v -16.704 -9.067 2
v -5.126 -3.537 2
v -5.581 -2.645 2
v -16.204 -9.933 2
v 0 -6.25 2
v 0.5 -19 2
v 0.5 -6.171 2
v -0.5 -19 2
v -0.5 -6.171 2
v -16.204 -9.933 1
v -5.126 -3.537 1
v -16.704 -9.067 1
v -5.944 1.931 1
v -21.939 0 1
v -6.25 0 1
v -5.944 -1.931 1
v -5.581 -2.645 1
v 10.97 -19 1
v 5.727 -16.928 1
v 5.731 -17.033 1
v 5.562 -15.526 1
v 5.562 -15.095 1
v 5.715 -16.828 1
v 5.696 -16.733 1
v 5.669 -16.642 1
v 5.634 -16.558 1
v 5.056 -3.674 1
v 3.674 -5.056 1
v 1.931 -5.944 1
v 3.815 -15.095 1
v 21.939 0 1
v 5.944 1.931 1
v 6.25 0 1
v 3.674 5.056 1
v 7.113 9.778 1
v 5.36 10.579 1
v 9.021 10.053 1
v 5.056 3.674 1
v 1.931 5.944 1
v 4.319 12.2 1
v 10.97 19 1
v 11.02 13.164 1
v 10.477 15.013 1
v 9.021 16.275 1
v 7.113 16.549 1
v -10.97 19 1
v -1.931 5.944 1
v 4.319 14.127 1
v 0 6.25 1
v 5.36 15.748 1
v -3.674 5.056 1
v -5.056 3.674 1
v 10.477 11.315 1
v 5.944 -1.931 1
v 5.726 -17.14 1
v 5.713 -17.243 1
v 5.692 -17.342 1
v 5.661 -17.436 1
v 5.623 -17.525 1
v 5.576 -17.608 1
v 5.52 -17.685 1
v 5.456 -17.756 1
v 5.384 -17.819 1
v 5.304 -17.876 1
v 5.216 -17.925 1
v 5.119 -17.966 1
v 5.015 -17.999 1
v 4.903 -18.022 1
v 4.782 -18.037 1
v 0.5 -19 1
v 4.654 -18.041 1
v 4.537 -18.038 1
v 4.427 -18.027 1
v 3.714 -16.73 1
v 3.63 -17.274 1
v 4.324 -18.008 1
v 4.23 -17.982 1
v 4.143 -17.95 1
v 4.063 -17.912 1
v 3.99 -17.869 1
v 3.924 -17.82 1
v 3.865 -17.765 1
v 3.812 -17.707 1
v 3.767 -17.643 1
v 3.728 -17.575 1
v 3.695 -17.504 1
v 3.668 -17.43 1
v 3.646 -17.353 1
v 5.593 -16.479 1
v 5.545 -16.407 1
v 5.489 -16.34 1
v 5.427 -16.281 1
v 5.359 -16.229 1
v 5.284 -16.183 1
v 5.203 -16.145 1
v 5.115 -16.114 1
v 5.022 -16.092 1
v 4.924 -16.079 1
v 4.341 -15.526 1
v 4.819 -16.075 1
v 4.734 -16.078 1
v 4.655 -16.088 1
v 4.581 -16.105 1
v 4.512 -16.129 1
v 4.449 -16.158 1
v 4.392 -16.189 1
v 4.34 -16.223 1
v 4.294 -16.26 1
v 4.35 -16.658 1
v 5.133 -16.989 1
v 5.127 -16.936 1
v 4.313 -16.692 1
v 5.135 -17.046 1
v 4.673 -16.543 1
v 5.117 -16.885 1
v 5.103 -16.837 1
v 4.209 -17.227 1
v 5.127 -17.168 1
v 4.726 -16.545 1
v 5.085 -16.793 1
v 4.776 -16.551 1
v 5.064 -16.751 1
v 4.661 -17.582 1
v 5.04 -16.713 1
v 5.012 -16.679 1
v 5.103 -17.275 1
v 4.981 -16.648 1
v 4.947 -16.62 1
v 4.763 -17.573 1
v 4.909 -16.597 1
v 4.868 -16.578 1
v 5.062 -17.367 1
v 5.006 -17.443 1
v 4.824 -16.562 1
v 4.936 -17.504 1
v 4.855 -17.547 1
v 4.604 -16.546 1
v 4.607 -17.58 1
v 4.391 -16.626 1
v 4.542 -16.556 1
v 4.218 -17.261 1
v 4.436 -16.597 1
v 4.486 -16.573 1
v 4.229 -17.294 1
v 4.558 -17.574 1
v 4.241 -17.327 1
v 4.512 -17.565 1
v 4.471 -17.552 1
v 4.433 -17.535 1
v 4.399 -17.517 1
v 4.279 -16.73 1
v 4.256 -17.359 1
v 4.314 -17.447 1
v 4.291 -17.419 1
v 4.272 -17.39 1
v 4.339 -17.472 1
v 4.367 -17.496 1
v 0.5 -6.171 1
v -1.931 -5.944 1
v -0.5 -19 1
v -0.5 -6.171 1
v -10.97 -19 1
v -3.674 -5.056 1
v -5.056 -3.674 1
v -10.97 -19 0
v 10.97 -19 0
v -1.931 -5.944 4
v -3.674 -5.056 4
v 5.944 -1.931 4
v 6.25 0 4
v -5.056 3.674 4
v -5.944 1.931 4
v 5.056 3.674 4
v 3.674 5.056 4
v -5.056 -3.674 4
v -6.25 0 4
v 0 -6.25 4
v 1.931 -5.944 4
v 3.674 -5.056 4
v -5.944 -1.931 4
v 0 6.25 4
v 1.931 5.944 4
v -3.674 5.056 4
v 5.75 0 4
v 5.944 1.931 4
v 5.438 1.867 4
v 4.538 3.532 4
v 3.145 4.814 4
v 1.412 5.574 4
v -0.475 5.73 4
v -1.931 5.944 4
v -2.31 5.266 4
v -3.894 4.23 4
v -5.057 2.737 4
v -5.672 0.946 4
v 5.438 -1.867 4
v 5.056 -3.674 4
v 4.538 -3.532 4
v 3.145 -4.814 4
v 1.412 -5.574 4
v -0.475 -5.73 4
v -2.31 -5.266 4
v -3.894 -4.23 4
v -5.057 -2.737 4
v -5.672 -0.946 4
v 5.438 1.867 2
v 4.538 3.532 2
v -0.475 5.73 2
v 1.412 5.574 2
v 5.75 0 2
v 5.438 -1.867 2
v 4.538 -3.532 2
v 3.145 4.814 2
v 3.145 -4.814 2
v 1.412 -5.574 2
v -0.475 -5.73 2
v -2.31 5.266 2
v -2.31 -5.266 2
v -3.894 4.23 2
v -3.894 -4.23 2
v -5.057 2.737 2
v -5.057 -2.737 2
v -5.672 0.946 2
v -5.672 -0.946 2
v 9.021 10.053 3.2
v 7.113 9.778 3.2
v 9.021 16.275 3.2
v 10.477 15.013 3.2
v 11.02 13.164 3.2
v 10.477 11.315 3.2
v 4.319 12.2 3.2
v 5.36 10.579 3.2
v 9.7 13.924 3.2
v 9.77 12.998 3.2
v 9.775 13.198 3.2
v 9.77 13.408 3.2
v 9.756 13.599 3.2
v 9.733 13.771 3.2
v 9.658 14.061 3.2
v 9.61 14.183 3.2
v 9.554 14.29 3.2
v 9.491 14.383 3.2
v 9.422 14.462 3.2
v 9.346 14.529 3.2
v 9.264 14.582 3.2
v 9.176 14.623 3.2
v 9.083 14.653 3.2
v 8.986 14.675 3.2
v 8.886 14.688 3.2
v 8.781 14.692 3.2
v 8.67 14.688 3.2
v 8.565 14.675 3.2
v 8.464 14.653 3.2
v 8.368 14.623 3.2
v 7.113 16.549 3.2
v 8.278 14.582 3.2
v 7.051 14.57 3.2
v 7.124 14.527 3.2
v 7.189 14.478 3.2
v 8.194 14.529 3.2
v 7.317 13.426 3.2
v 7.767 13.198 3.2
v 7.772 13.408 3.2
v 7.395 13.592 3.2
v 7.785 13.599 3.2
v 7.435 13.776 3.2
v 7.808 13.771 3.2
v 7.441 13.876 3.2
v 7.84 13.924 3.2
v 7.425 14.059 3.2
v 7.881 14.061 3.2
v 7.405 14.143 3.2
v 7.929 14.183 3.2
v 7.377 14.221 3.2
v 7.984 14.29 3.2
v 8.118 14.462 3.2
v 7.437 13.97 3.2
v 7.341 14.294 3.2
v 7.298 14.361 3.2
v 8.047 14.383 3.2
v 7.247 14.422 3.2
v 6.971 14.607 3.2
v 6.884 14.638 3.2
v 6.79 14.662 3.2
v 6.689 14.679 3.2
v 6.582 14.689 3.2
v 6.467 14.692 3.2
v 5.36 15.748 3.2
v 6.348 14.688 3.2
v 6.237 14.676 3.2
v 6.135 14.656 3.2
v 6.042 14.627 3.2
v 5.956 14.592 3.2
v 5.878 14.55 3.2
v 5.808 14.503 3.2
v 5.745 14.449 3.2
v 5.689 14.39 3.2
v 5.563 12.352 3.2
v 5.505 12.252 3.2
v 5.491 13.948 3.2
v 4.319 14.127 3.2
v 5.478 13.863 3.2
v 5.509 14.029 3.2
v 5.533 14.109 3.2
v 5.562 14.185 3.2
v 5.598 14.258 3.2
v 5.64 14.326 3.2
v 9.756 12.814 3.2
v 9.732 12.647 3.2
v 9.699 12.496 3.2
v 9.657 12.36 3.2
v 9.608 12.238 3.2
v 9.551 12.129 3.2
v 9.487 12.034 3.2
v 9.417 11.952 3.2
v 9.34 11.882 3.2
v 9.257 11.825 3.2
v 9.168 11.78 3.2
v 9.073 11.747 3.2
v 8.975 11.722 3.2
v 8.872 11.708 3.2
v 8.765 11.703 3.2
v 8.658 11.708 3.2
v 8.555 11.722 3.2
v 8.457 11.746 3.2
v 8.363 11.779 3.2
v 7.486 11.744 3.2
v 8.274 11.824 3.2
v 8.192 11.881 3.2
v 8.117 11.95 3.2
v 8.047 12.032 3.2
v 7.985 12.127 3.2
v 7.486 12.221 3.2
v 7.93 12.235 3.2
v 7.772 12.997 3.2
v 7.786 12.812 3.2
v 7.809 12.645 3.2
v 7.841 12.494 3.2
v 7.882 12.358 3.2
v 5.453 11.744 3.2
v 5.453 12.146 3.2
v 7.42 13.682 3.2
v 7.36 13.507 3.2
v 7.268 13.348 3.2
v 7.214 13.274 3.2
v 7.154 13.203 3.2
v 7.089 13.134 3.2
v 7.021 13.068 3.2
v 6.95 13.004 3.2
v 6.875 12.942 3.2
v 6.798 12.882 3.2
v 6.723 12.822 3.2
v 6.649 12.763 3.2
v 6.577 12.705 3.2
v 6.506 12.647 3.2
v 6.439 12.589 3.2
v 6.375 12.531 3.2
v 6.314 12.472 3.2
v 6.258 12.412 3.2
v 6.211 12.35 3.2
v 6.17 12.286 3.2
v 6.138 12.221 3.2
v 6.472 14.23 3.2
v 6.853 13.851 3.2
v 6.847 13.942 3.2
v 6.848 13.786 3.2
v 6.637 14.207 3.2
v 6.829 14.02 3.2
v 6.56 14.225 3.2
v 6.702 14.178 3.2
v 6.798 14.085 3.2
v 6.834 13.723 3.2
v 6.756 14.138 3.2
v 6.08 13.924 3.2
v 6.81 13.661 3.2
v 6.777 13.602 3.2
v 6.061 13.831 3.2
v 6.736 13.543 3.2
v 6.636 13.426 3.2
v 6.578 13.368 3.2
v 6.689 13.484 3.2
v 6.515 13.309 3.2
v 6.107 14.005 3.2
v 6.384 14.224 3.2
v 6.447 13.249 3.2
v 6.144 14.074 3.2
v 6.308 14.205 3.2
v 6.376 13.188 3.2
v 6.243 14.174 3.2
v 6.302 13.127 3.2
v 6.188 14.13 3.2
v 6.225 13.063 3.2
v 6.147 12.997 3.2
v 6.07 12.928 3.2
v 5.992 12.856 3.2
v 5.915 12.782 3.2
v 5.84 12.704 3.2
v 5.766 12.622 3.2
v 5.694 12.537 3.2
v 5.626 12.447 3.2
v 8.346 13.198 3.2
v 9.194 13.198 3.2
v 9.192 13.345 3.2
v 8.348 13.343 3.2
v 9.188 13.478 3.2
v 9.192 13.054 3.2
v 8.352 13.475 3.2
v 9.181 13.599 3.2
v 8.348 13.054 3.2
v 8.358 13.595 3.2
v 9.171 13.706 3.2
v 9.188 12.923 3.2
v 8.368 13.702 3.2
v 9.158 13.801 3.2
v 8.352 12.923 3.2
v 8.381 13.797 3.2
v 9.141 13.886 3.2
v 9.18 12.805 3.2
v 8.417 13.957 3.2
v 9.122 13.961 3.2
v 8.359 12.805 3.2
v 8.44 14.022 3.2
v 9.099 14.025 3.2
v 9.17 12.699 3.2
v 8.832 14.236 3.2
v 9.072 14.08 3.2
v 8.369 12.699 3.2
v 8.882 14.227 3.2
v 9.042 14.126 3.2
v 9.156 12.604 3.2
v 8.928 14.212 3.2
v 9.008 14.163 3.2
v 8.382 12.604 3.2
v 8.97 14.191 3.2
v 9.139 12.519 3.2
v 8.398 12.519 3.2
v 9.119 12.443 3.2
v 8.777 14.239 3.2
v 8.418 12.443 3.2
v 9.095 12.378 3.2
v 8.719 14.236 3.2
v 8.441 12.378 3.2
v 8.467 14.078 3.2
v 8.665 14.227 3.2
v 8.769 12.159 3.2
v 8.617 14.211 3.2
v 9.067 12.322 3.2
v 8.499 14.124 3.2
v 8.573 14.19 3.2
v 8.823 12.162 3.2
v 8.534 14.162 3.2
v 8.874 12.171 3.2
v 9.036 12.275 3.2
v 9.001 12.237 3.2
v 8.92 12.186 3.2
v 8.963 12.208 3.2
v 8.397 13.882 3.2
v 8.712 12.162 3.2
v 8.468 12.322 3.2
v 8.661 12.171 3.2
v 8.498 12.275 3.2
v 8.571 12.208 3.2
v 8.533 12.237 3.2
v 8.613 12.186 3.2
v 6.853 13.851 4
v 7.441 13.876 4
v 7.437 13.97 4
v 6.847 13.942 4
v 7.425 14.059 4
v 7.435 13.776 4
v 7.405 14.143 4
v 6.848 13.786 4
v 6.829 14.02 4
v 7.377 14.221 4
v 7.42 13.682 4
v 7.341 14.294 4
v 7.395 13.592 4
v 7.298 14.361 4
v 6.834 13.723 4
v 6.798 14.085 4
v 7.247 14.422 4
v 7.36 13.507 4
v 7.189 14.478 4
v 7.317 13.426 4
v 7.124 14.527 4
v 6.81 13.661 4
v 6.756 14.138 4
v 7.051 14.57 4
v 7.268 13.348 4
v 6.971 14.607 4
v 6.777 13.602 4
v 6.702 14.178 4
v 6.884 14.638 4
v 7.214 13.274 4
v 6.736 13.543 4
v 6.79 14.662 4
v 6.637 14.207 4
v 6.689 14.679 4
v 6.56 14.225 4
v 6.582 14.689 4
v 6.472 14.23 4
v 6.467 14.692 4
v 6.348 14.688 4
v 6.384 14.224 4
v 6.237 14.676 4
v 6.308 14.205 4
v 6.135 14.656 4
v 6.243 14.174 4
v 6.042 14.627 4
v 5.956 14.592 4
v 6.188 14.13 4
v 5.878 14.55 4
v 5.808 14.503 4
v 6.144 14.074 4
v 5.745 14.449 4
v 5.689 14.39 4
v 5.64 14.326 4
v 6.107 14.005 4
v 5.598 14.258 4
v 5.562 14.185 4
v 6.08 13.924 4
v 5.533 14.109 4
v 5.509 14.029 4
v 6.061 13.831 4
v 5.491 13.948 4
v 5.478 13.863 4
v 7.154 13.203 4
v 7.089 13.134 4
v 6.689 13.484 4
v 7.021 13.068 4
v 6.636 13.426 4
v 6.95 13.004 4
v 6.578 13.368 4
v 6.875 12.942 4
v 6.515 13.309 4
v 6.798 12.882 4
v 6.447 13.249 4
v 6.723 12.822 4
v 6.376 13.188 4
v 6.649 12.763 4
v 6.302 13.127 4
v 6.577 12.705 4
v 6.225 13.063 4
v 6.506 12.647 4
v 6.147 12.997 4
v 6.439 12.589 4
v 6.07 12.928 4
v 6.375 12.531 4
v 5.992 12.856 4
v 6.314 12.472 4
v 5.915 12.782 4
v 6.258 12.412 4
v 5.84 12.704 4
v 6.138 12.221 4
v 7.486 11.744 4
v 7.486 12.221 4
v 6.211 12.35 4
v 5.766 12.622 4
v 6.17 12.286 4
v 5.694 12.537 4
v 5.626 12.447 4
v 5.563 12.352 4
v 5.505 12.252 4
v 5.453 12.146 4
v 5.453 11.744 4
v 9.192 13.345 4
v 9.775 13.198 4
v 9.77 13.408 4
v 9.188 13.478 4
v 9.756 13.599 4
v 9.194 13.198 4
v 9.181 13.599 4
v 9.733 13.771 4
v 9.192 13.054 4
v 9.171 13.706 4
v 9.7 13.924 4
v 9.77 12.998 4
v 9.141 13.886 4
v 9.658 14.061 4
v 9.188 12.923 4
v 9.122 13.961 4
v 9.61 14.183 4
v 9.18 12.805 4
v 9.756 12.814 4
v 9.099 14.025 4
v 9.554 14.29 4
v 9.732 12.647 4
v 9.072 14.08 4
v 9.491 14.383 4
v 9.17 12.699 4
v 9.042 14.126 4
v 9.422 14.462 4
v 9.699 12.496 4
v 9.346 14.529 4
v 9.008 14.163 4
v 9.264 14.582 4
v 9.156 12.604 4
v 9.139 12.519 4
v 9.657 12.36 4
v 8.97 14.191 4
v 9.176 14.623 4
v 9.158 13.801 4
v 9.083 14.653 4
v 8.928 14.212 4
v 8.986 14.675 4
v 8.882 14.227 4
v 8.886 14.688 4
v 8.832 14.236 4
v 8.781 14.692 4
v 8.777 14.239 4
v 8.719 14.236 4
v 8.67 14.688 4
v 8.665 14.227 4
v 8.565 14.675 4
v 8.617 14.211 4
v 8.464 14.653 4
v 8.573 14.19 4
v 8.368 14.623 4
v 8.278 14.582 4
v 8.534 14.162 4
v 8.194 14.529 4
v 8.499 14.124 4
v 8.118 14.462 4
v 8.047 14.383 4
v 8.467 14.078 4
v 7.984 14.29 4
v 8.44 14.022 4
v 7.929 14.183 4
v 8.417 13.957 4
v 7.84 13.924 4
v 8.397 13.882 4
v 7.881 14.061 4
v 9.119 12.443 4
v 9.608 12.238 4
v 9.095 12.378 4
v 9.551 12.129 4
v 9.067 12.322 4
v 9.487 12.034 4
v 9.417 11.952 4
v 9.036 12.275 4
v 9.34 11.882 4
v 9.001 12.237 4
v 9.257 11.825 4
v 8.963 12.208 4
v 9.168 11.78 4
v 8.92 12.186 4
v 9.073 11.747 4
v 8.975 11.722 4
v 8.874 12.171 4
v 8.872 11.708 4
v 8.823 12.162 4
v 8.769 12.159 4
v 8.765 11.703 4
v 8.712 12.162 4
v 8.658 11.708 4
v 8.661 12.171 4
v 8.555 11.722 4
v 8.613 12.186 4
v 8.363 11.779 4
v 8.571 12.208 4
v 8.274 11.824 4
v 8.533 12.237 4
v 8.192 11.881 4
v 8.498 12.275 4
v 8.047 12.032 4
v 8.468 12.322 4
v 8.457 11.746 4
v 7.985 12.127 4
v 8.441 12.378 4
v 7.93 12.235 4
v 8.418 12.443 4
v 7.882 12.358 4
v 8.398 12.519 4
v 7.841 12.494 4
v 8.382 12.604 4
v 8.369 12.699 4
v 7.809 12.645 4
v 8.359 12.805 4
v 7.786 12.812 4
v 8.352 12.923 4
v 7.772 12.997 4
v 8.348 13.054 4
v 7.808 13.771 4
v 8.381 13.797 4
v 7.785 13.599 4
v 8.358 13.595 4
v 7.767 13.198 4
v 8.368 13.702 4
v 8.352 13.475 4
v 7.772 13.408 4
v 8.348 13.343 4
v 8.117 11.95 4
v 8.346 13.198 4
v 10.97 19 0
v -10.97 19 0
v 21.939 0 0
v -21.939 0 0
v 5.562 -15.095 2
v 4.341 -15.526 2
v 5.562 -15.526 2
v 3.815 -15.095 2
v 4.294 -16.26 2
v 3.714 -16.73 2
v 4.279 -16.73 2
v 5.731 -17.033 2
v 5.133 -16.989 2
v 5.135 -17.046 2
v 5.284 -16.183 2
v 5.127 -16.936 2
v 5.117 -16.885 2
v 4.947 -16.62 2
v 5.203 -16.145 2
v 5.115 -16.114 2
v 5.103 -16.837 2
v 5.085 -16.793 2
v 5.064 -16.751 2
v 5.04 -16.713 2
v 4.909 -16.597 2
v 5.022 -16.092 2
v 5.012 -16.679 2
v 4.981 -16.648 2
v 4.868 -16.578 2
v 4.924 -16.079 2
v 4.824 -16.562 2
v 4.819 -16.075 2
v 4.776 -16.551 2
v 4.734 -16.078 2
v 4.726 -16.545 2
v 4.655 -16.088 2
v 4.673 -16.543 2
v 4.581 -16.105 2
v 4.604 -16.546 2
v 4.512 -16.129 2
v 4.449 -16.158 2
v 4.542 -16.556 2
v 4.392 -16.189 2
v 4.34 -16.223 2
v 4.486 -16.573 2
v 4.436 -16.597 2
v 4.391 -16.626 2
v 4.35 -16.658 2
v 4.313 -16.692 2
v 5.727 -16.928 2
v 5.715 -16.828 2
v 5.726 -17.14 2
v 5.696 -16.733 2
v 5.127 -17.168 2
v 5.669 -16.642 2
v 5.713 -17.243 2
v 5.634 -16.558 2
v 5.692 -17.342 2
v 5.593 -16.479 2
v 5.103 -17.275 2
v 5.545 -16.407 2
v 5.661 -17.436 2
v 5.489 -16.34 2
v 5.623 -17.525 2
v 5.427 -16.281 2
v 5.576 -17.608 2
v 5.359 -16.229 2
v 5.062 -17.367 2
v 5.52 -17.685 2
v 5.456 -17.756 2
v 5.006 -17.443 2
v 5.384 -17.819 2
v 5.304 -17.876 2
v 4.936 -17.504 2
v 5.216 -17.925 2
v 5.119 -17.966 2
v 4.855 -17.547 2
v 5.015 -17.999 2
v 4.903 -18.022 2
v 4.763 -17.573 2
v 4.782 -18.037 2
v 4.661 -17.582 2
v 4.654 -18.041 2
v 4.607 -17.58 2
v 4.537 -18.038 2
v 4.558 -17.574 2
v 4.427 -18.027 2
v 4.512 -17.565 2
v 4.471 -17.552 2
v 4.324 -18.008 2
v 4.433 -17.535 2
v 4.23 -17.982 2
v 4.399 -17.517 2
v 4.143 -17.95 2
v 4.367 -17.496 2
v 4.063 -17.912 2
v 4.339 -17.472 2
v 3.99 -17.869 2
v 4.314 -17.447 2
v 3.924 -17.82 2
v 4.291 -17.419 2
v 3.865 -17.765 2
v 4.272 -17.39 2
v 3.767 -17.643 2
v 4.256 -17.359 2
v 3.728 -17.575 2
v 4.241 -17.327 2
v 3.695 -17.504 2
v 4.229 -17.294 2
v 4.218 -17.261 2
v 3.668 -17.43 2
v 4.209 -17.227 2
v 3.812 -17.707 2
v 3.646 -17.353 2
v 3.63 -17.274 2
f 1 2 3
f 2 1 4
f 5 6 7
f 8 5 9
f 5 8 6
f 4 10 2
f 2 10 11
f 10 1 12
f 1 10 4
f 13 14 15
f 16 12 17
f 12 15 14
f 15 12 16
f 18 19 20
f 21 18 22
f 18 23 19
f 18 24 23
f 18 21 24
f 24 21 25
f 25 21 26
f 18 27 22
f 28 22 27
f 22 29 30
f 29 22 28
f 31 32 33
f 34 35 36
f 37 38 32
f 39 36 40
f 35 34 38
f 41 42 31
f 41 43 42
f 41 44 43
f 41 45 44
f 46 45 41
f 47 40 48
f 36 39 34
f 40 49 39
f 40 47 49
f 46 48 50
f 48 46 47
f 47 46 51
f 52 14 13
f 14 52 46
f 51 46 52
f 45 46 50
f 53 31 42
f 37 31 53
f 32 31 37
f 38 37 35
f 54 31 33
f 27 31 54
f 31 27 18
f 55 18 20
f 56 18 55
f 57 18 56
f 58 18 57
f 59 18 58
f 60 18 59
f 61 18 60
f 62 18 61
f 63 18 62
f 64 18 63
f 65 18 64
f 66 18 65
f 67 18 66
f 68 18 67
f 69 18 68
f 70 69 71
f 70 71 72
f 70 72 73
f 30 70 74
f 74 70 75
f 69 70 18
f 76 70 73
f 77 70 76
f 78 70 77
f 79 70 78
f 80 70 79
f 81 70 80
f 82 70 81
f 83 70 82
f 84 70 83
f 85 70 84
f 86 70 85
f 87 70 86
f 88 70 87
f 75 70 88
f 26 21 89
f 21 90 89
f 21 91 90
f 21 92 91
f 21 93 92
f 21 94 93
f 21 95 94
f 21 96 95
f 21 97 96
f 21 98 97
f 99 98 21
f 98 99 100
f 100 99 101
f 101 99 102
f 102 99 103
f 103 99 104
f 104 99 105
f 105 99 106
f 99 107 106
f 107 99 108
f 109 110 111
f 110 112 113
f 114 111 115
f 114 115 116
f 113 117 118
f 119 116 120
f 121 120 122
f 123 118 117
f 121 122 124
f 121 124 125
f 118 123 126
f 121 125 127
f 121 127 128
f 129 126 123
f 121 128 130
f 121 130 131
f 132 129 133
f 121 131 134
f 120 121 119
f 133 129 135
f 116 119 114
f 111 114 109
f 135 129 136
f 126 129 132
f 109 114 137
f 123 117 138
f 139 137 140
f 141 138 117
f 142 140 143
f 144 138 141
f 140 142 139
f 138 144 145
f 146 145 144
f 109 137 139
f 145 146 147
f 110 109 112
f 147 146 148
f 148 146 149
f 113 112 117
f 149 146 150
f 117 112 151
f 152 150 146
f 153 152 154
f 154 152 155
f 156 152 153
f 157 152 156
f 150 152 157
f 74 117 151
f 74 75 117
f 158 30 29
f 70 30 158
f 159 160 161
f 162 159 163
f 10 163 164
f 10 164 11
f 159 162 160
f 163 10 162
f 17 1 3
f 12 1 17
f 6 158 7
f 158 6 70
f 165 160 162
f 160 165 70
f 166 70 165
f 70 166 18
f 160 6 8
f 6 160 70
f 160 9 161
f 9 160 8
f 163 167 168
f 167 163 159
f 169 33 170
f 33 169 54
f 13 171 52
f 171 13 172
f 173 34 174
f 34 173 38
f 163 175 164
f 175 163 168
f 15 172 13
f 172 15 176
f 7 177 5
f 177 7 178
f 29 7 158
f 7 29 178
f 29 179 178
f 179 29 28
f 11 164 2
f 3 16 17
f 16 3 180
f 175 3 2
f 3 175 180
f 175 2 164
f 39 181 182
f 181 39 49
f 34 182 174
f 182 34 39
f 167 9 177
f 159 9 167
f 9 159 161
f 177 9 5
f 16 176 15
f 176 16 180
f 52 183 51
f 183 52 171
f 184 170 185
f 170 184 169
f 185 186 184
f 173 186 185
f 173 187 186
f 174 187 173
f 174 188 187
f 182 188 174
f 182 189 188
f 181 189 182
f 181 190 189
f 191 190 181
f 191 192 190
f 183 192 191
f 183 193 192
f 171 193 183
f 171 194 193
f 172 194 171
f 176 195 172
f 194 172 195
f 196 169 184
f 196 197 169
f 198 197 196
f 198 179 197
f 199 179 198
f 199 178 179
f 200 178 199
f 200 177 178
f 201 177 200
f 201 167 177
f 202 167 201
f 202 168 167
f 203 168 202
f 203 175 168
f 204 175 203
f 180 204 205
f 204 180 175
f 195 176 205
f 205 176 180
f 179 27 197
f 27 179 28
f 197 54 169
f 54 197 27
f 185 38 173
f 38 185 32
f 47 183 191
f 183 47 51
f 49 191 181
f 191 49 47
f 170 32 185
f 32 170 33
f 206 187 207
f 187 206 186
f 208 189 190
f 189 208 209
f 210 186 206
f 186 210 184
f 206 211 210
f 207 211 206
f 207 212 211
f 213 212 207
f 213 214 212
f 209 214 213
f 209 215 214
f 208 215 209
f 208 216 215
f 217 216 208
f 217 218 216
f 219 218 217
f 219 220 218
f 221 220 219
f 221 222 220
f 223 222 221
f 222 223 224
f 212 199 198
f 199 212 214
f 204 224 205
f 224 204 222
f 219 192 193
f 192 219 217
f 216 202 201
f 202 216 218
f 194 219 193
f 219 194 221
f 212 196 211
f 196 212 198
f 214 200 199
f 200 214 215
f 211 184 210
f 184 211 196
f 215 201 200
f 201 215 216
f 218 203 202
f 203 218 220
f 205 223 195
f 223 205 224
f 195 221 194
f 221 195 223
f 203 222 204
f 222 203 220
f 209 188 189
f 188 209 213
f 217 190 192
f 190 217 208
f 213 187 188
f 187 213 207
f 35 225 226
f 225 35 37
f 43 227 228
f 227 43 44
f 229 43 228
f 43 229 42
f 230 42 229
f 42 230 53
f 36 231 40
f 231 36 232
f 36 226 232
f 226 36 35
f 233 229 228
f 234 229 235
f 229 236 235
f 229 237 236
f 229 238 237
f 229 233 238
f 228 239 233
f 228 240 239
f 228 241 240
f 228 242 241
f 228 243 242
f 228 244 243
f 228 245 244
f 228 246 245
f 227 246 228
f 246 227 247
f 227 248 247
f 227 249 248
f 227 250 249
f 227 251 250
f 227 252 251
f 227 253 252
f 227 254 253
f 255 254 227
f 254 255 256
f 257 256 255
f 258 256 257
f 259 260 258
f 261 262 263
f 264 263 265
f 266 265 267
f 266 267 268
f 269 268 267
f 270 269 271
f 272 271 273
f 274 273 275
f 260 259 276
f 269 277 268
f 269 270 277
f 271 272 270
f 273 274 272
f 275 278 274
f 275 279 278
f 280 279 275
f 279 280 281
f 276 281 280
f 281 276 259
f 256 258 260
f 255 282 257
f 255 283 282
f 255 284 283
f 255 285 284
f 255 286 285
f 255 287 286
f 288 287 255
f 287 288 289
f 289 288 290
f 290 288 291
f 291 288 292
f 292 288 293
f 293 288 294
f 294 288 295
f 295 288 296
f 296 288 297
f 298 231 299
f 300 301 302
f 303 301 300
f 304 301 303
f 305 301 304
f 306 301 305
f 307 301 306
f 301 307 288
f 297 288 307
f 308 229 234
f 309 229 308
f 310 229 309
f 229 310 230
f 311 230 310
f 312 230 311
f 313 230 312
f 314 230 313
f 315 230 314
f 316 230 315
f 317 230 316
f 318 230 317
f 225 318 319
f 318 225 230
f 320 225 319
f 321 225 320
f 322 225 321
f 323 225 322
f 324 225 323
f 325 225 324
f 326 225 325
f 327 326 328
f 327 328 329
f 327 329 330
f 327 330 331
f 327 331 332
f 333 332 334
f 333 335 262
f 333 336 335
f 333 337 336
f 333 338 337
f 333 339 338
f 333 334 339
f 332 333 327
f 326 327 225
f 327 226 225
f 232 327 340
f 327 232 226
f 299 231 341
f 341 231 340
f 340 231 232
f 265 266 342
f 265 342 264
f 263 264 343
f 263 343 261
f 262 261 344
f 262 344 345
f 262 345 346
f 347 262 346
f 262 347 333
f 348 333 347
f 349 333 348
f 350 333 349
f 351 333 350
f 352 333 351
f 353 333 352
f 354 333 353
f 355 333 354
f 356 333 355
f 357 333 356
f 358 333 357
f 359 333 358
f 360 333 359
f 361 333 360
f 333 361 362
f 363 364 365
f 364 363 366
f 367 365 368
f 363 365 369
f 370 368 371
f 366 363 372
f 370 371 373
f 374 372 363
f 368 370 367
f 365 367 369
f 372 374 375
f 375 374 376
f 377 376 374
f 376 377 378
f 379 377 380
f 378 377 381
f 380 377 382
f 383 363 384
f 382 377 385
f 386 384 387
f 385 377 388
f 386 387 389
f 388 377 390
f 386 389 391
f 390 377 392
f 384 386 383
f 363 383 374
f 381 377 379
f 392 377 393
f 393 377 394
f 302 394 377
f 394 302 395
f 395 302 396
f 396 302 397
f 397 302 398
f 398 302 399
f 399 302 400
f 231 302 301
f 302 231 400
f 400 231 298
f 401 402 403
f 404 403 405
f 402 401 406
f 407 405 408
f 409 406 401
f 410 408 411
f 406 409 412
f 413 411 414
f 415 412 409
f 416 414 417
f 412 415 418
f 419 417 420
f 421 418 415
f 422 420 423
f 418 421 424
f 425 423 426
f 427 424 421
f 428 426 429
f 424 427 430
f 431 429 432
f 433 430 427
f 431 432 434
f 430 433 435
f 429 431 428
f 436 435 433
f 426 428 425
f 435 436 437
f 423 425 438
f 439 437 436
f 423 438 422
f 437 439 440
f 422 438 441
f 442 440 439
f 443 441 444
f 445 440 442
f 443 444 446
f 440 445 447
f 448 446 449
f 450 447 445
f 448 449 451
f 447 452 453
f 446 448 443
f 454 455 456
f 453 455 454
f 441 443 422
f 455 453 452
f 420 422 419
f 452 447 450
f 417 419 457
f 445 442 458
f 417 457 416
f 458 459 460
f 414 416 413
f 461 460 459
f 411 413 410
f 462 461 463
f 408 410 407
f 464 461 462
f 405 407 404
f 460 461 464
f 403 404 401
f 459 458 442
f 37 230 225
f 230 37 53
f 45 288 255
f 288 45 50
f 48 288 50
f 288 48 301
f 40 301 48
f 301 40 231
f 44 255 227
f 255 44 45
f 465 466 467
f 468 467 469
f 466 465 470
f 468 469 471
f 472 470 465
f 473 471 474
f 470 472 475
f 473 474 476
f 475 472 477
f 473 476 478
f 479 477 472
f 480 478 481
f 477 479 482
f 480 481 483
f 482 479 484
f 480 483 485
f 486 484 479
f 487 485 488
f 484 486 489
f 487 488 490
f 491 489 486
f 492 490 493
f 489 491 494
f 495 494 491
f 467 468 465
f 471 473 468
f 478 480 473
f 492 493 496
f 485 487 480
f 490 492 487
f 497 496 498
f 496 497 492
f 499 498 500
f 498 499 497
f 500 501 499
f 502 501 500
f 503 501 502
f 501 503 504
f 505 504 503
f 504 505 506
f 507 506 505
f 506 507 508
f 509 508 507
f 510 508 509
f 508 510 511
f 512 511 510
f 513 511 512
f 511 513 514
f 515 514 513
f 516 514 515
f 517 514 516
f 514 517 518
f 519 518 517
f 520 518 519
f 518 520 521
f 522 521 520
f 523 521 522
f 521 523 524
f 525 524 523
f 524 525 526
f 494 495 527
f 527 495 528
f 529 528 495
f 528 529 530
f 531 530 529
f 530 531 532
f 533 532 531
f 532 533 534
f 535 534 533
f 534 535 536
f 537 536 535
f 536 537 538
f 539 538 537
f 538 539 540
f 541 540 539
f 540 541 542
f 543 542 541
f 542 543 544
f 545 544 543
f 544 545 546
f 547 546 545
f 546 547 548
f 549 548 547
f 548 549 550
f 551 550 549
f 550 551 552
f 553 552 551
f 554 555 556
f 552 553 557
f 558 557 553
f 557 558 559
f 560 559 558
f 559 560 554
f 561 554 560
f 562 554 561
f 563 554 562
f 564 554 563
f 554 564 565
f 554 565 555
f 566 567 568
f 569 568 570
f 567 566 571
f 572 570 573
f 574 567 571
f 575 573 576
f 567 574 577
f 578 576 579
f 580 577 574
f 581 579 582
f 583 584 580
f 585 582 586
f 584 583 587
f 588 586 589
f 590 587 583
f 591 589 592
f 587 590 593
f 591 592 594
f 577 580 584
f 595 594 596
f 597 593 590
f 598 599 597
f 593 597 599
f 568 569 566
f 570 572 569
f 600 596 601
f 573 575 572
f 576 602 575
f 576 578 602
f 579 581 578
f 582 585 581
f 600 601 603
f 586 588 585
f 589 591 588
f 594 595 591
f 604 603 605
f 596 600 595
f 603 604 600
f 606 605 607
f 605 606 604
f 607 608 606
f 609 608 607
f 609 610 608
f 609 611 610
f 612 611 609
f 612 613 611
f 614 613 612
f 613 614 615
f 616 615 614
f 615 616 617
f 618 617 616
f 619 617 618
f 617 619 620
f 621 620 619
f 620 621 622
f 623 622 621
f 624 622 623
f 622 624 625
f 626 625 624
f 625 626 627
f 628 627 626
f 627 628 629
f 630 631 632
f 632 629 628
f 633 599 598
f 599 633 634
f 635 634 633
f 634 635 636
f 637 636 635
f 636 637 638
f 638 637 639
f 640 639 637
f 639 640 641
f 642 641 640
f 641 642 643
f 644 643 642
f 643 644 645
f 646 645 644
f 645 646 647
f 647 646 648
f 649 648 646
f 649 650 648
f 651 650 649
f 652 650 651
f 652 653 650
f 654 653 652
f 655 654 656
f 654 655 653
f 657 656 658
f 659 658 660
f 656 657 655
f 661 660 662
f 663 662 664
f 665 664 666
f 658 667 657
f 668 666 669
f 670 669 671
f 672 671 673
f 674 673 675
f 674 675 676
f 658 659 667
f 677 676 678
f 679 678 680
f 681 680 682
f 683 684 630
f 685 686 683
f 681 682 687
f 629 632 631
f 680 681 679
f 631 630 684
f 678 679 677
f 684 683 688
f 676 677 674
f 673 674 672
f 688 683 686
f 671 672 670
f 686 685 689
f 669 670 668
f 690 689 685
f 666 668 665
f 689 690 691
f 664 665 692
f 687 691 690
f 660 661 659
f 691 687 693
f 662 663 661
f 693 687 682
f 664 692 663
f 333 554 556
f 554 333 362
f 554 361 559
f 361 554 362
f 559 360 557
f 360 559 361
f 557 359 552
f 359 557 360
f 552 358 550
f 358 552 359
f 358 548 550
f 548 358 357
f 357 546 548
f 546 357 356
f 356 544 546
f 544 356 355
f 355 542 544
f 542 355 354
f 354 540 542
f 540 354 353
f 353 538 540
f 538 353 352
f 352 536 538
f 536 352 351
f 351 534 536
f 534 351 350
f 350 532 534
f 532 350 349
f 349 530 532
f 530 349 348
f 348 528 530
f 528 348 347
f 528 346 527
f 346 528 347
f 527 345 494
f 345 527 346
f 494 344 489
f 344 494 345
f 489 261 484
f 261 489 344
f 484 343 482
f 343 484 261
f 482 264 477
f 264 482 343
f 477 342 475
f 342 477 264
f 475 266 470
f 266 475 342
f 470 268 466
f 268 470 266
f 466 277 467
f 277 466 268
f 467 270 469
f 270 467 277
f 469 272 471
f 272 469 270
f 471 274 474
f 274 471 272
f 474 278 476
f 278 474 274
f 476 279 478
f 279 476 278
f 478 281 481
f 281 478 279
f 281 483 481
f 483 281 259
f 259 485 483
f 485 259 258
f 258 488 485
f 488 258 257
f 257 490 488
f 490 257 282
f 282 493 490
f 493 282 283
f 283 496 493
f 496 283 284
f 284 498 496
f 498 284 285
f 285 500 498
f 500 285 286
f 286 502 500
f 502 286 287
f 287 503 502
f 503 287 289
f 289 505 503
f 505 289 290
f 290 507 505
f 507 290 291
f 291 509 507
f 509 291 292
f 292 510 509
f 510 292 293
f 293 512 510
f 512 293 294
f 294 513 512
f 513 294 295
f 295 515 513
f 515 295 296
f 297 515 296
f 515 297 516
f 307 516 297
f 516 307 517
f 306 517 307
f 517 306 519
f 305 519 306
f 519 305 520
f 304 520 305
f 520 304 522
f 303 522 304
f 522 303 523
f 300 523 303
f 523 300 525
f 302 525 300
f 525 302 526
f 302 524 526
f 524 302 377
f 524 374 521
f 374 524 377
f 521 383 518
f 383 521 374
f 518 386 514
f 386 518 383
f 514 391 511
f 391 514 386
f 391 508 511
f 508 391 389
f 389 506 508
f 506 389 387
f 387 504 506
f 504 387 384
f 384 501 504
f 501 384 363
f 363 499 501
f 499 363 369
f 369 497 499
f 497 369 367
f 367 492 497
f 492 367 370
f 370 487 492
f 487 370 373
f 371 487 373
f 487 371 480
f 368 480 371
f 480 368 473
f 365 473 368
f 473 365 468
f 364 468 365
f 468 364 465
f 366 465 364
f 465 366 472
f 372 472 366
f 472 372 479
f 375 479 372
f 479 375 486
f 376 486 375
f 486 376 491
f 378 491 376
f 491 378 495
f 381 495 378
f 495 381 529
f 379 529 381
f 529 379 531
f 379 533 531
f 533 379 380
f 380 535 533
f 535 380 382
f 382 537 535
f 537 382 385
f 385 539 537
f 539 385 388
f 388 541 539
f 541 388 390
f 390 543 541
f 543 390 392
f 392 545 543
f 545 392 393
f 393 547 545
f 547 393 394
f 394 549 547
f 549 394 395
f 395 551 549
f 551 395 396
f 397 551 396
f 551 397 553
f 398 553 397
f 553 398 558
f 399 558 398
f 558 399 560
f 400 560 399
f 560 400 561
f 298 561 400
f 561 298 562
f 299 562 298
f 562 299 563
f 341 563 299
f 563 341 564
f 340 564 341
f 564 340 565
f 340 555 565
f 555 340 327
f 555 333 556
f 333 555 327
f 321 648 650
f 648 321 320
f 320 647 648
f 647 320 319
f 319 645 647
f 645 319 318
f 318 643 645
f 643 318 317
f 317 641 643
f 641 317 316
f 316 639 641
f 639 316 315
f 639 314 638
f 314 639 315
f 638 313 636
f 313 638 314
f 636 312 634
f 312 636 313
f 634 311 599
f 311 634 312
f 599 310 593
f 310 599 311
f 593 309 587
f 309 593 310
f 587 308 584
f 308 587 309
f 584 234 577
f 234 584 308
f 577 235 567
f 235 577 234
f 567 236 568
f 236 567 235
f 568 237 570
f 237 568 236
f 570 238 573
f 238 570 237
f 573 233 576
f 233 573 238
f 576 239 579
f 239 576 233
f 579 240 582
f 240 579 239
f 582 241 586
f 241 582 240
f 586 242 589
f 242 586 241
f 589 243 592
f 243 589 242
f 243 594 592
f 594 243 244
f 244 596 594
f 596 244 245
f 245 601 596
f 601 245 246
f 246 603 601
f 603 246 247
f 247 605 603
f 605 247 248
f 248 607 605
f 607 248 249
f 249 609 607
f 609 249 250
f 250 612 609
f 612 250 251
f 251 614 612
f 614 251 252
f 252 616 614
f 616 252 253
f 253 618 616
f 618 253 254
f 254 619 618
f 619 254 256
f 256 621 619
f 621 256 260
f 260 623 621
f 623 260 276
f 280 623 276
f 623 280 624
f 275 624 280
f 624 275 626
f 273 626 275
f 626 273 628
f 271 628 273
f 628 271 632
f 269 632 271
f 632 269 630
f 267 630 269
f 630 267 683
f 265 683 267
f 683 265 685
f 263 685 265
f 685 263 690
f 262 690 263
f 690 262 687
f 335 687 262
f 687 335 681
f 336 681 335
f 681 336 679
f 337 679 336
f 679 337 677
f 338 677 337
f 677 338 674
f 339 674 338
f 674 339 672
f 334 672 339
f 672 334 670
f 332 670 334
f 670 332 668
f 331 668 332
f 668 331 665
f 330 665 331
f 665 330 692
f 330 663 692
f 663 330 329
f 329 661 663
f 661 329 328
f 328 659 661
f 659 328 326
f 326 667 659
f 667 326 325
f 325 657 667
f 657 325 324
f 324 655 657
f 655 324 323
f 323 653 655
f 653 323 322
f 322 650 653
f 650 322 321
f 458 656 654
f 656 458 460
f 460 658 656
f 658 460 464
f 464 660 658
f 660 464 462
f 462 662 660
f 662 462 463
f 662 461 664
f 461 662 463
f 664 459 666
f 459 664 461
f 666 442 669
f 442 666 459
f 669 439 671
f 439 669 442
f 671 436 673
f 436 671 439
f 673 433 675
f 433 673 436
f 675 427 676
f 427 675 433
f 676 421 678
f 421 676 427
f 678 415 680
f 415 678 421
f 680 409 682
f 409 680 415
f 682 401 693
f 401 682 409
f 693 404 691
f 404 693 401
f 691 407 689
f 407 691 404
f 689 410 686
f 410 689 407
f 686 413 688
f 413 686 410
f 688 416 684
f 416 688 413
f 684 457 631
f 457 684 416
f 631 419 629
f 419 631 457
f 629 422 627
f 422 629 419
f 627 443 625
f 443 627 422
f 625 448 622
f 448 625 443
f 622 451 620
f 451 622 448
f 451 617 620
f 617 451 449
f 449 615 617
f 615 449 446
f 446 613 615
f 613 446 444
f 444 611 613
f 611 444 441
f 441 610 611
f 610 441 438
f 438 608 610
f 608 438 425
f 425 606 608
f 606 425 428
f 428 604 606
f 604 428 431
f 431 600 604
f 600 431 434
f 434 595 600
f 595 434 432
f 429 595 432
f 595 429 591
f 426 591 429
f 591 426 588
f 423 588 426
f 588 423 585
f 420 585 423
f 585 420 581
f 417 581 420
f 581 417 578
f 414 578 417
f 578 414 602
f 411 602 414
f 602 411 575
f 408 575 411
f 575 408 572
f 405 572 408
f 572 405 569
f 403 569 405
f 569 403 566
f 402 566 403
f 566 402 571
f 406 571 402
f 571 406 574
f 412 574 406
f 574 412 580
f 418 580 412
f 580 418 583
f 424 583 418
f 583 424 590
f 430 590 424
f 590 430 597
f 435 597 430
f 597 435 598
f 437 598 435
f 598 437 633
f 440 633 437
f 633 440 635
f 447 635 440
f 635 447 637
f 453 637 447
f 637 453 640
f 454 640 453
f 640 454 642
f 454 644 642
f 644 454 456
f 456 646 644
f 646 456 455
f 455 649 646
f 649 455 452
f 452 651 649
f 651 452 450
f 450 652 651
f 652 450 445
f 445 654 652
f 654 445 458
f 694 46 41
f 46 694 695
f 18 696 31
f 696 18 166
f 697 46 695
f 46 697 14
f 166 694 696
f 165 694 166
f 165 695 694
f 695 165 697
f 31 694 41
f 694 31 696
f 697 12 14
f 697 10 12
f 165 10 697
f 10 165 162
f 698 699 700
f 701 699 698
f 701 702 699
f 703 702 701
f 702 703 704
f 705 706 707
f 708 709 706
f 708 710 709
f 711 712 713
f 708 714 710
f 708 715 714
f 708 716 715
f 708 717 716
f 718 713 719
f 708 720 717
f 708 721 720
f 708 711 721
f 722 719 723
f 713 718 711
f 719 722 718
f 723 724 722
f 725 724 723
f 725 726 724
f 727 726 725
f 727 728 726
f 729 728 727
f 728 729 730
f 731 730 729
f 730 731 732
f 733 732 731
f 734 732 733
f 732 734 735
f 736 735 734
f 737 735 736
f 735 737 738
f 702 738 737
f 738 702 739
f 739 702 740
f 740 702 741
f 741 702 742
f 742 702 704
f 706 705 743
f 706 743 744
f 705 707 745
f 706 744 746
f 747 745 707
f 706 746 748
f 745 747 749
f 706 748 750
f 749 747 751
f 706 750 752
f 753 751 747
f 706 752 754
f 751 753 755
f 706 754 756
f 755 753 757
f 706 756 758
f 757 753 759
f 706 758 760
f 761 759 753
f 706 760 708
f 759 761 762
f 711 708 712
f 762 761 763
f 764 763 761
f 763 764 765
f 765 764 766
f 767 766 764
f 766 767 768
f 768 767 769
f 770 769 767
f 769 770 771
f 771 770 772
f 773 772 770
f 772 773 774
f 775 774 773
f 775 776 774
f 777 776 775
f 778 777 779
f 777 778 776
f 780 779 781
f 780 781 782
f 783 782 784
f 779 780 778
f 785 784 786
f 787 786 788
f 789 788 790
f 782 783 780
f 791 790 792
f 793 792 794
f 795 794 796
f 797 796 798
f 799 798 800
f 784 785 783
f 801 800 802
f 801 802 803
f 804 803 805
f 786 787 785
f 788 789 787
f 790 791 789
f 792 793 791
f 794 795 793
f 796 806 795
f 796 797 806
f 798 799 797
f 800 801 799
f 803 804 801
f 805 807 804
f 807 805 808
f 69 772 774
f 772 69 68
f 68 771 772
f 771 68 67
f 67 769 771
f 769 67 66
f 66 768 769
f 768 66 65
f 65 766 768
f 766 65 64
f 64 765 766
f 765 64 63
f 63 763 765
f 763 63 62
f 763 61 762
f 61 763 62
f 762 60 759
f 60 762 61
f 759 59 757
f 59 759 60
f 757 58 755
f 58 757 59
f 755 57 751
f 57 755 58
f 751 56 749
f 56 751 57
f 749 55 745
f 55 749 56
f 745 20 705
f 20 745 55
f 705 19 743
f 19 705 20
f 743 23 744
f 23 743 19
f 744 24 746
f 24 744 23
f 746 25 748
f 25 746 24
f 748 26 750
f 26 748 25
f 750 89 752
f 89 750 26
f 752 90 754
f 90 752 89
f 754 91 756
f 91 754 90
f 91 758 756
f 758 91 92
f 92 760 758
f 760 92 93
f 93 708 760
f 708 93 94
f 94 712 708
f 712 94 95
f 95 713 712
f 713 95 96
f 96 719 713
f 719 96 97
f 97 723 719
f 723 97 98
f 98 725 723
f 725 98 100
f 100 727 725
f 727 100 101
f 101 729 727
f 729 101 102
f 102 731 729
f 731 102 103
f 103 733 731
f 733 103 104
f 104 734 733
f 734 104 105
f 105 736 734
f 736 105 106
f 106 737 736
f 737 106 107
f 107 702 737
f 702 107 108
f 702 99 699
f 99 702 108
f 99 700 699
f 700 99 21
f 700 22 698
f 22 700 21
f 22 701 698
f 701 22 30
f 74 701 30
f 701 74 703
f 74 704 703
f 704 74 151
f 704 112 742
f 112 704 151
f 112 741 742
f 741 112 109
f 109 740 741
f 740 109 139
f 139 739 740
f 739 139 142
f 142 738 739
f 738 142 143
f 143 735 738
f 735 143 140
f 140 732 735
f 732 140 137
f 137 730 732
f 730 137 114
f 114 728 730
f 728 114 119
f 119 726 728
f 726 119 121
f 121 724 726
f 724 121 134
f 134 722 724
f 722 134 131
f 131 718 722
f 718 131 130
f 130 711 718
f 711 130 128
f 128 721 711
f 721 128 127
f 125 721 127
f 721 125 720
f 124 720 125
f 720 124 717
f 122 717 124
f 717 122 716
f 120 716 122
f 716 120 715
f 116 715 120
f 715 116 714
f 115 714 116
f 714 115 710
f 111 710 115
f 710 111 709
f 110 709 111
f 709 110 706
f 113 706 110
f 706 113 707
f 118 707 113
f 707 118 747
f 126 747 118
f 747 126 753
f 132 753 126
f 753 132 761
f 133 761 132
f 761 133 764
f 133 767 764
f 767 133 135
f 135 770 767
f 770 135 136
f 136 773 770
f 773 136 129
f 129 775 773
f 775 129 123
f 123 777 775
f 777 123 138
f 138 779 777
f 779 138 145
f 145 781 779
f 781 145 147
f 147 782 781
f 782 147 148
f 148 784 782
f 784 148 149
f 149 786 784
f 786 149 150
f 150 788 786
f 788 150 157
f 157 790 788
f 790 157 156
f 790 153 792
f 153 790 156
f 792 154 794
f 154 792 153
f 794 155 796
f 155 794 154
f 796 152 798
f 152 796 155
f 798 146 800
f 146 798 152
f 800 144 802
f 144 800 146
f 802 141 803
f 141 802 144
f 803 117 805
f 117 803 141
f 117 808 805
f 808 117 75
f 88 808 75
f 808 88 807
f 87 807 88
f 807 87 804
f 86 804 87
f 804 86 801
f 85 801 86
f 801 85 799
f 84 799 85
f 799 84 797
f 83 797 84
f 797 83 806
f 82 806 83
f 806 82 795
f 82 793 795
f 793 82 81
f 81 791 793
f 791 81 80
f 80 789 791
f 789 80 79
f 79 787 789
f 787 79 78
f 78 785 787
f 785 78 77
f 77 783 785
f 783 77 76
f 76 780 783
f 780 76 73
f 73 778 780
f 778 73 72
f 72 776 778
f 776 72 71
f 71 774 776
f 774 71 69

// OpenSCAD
include <../Scripts/18xx tiles basic functions.scad>
hex();
put_tilenr("5");
single_city(v=[2, 3]);
put_value("20",30);
